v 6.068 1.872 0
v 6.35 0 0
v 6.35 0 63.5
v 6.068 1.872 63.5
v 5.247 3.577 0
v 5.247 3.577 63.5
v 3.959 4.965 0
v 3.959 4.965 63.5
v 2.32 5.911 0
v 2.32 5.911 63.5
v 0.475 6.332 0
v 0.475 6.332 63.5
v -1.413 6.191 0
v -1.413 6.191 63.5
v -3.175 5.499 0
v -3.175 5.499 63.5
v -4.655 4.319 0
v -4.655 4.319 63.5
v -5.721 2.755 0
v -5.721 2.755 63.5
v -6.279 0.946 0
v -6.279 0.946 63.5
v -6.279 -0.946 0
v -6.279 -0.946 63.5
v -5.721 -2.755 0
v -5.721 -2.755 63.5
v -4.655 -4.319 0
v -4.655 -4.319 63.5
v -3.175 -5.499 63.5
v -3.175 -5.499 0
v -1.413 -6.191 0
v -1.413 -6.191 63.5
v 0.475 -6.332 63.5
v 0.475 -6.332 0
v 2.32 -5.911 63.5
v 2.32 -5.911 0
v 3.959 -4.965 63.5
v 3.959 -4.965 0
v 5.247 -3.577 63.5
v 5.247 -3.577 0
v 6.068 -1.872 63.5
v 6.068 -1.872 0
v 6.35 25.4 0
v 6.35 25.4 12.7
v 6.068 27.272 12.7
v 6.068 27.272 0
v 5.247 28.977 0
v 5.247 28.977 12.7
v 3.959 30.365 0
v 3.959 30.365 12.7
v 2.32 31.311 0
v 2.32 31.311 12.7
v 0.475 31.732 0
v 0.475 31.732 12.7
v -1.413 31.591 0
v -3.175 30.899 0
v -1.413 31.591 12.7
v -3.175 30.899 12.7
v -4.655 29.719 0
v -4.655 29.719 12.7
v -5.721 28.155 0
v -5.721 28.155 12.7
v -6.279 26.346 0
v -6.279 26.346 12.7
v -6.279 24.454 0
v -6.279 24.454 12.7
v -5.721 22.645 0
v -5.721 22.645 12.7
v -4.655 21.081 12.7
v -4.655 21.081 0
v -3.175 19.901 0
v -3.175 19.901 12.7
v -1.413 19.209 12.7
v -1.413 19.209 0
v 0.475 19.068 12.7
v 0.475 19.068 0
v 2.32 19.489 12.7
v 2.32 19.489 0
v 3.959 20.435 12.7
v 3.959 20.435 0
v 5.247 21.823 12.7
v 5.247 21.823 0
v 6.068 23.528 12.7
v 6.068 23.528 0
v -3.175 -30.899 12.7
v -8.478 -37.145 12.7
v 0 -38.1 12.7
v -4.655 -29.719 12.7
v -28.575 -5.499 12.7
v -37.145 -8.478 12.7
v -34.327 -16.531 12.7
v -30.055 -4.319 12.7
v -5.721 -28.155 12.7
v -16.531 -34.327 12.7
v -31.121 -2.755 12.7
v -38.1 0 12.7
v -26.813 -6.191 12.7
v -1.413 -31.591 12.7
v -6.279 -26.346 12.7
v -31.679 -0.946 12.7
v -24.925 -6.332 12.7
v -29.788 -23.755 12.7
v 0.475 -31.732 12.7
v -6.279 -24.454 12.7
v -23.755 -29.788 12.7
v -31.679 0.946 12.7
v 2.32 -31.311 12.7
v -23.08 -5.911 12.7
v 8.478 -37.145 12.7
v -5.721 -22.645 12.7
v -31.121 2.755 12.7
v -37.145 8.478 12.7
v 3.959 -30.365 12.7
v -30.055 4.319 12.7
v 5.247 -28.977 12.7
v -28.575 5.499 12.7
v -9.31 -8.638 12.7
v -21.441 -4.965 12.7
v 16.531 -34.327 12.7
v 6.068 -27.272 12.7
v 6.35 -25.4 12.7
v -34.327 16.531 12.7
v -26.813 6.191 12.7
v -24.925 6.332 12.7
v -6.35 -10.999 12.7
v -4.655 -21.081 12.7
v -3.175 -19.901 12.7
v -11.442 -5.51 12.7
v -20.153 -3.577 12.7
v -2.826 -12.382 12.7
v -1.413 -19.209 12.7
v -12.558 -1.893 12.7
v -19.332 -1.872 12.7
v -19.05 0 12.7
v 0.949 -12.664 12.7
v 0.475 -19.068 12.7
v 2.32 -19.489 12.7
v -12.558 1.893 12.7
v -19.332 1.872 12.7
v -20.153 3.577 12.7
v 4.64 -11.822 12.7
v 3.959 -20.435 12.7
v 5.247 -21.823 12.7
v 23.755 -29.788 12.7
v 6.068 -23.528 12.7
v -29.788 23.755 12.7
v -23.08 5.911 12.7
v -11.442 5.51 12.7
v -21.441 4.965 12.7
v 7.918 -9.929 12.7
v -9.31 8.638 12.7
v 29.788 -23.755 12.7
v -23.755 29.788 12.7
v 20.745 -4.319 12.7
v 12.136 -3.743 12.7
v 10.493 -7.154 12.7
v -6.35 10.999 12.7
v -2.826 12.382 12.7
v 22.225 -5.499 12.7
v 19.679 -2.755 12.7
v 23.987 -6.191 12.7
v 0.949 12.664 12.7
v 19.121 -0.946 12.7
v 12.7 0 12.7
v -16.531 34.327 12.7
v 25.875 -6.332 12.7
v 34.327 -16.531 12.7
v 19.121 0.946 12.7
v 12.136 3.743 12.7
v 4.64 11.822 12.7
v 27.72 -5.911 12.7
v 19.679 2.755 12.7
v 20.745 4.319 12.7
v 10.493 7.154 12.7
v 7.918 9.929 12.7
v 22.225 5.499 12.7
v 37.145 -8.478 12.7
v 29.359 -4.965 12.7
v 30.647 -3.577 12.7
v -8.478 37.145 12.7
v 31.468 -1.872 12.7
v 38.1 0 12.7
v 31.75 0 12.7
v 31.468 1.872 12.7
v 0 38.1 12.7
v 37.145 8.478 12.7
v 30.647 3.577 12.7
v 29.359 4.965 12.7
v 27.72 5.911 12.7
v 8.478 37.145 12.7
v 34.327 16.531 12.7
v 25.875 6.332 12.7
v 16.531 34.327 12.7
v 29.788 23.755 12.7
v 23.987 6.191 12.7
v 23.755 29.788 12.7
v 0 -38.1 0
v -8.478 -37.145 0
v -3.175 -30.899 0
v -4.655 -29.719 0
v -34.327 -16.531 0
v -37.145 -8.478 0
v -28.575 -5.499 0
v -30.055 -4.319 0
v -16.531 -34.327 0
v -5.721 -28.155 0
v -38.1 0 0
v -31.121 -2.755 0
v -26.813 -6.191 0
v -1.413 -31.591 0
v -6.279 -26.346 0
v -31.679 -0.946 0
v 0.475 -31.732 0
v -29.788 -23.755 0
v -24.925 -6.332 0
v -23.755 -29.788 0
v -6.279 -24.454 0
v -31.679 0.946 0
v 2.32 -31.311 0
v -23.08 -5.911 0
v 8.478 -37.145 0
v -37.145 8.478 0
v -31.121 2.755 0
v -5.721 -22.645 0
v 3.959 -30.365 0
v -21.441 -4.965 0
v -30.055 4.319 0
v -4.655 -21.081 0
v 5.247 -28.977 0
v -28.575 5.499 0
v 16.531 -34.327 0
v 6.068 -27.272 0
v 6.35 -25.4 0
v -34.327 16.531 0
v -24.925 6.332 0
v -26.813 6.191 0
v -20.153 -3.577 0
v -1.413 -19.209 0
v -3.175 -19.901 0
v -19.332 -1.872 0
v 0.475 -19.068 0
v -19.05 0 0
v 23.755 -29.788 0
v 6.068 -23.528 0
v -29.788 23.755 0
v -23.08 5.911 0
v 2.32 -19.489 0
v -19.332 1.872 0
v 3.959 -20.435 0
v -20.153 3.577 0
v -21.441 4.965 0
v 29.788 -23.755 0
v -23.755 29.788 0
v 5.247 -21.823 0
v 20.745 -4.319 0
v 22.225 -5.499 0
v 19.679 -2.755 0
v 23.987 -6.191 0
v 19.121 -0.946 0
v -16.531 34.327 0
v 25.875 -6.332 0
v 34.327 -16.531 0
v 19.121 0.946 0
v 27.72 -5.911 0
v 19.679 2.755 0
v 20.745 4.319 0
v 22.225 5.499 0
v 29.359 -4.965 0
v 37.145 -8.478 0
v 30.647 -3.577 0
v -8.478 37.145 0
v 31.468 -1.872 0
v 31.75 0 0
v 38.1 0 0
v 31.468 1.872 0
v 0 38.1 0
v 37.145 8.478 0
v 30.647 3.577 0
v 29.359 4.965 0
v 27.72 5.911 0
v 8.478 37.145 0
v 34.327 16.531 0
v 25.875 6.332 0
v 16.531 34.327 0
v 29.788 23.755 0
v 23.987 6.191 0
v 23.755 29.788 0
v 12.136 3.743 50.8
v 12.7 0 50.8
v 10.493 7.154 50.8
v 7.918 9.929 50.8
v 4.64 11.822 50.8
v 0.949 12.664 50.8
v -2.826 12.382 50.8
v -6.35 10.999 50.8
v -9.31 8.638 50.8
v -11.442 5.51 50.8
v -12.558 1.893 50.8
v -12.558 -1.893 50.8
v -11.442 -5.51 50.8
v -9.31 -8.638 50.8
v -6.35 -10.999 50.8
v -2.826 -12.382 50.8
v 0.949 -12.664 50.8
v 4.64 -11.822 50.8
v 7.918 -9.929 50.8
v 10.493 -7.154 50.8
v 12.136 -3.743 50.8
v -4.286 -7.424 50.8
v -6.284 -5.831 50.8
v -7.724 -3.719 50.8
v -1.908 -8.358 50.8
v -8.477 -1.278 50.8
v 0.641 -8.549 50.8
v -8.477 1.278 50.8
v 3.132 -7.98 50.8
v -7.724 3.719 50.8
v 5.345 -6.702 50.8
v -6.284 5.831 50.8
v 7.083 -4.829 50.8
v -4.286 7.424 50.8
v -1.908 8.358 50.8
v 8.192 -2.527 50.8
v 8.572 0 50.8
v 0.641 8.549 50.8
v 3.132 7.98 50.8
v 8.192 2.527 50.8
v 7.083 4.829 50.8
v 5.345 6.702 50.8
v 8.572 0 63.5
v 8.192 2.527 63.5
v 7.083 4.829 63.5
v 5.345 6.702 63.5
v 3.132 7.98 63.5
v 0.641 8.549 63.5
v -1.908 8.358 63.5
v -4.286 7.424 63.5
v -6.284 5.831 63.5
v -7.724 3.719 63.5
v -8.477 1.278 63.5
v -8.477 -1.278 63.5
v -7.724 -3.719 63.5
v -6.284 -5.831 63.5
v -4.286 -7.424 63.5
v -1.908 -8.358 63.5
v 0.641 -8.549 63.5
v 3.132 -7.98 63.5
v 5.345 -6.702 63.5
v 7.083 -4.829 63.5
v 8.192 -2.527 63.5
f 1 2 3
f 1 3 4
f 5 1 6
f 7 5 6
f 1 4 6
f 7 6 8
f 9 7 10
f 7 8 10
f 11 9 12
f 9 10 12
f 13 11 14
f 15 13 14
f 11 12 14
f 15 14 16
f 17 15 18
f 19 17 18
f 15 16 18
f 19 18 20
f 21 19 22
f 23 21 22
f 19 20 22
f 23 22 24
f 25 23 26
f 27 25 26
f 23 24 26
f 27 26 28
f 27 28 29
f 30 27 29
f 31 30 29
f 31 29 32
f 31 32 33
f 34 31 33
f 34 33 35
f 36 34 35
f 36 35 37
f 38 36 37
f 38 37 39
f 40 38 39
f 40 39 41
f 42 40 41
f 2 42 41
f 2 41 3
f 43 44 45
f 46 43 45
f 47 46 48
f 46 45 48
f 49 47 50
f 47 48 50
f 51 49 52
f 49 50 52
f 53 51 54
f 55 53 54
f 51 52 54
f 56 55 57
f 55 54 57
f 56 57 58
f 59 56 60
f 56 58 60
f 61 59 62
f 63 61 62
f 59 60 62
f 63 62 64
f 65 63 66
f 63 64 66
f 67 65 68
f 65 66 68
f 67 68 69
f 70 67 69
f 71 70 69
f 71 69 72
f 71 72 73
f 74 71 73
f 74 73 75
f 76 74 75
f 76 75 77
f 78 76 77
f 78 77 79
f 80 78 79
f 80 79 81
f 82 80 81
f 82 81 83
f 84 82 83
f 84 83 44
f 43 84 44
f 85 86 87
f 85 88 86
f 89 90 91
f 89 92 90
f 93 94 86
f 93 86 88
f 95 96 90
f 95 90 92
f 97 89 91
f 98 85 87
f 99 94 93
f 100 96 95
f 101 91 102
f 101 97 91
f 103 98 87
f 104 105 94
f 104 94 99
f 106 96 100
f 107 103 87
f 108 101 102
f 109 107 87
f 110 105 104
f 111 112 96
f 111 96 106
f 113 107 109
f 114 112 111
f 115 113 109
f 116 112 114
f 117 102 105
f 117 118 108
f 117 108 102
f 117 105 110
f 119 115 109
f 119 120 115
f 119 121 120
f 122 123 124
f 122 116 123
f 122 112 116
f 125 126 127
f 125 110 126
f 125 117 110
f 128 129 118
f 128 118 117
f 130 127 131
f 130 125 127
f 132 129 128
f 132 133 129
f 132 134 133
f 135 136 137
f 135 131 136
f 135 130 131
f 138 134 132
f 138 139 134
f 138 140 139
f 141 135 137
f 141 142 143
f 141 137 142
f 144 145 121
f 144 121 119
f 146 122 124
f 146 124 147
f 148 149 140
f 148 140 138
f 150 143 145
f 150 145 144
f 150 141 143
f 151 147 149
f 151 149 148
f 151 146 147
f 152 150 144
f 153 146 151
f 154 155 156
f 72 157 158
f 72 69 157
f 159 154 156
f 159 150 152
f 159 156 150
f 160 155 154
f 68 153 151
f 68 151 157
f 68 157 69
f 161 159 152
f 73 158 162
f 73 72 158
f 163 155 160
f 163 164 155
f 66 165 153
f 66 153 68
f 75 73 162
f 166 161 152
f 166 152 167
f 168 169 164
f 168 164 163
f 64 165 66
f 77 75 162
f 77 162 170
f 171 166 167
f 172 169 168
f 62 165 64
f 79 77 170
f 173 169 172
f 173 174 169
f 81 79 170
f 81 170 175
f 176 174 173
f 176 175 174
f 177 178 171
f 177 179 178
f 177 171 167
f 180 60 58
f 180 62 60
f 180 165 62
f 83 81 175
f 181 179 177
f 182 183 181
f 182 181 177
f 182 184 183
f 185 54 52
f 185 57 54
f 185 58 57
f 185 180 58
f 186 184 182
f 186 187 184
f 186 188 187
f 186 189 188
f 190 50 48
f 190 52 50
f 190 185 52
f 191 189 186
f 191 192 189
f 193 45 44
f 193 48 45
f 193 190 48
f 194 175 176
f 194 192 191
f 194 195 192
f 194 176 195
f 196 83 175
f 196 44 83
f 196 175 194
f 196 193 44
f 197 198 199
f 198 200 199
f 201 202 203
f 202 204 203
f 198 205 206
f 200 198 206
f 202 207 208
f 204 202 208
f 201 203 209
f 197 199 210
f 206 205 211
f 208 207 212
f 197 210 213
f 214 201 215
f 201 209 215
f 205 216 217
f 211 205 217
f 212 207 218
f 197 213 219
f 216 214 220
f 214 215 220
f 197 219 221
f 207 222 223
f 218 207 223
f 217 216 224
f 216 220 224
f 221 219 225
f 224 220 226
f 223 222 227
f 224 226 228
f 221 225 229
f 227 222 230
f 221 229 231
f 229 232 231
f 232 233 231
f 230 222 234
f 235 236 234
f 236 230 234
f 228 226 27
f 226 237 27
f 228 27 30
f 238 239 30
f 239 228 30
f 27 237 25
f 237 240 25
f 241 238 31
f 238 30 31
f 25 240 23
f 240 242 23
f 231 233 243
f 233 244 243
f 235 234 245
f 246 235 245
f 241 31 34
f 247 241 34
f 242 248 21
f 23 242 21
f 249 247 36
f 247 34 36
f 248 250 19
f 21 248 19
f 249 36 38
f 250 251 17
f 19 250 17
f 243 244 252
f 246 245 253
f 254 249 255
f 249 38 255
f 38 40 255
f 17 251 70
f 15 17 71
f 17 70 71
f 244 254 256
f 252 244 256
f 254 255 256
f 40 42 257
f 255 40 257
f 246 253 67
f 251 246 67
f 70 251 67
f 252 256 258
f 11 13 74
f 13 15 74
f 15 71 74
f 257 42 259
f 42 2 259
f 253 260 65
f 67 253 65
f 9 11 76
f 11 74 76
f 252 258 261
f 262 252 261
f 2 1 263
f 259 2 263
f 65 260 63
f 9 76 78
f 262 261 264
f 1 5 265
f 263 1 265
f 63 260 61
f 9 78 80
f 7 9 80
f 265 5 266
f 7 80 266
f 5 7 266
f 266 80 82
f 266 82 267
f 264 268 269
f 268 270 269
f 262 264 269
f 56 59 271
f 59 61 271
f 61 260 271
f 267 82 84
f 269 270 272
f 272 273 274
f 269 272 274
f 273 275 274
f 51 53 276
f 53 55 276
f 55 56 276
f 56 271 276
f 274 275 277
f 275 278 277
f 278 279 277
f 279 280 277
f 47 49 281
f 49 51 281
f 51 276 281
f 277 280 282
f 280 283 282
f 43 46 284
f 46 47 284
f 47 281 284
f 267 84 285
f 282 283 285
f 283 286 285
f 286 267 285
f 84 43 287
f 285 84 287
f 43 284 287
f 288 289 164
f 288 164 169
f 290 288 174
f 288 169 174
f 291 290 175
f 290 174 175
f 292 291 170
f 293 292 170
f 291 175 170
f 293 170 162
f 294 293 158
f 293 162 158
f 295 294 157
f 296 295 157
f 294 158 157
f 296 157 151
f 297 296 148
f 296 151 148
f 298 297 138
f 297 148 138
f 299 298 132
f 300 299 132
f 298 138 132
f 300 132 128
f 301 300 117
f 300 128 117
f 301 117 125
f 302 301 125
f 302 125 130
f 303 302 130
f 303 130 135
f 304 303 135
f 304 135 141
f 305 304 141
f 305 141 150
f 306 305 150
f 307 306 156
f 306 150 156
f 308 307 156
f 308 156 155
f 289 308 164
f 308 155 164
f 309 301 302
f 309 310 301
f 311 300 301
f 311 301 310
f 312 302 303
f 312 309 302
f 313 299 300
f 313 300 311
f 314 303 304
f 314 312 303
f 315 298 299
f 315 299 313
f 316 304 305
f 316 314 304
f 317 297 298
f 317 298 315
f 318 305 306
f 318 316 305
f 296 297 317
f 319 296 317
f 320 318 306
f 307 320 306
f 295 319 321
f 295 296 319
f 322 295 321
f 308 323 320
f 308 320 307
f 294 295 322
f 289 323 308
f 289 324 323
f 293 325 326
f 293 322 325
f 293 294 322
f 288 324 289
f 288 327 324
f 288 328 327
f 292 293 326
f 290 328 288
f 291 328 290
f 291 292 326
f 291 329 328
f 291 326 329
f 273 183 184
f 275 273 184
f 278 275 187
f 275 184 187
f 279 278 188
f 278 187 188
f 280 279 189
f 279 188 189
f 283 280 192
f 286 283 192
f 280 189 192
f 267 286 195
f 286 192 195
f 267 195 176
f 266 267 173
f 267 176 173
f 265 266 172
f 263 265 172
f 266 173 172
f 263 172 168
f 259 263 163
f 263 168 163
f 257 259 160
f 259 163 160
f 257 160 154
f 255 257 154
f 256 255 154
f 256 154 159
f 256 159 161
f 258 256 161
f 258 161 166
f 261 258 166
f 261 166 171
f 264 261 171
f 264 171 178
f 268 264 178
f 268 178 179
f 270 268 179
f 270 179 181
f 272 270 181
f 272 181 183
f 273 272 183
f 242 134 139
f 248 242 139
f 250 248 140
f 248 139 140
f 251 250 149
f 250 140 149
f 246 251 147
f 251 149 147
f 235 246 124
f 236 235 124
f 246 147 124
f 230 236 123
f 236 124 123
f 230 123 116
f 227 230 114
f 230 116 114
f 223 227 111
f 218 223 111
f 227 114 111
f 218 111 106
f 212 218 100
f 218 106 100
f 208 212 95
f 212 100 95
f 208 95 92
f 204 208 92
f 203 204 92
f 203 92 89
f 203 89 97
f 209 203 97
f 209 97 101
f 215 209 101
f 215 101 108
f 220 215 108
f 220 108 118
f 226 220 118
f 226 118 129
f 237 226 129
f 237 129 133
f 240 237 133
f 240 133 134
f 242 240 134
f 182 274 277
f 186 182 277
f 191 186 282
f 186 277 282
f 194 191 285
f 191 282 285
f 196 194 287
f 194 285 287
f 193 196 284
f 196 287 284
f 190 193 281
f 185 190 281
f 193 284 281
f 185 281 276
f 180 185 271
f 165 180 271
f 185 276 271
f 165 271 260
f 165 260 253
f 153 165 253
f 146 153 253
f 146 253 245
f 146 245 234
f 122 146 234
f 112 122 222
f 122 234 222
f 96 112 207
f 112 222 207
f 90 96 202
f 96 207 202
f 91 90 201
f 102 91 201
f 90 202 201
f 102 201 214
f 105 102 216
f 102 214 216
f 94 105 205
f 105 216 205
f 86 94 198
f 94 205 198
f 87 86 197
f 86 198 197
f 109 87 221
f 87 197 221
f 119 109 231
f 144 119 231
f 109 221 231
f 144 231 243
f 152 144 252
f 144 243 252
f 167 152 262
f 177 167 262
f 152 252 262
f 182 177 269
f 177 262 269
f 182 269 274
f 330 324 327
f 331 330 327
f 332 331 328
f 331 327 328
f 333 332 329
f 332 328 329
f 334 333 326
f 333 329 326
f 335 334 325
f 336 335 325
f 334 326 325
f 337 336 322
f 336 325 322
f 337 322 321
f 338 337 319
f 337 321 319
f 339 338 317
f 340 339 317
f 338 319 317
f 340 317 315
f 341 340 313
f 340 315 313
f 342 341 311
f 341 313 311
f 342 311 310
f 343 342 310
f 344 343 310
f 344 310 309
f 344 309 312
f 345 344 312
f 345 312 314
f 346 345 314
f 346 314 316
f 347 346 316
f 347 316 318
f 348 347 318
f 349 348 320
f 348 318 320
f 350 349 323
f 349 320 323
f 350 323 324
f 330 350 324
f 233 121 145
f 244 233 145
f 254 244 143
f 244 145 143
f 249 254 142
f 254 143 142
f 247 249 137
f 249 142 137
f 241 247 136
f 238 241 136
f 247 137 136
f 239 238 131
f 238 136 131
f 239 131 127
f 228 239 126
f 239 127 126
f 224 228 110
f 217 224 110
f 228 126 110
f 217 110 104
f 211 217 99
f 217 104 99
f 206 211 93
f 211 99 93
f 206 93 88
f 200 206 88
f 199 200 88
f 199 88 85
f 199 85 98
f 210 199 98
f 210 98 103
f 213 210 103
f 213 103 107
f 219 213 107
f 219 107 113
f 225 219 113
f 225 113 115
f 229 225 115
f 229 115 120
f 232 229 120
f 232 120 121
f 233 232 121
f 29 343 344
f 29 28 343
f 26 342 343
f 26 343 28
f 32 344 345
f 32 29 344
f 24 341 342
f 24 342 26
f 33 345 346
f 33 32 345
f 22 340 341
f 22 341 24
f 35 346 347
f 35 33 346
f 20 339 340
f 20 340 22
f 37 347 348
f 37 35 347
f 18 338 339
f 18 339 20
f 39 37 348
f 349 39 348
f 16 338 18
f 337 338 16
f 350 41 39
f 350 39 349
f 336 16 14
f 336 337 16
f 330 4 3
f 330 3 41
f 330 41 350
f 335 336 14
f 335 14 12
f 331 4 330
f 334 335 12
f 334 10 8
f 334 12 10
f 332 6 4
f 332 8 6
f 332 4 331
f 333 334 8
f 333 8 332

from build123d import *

# Parameters (mm, degrees)
F0_R     = 38.1
F1_DEPTH = 12.7
F2_R     = 6.35
F3_DEPTH = 12.701
F4_R     = 12.7
F5_DEPTH = 38.1
F6_R     = 8.5725
F7_DEPTH = 12.7
F8_R     = 6.35
F9_DEPTH = 63.501


with BuildPart() as f1:
    # F0 (on Top) → F1 (new body)
    with BuildSketch(Plane.XY):
        Circle(F0_R)
    extrude(amount=F1_DEPTH)

    # F2 (on face) → F3 (cut, through all)
    with BuildSketch(Plane.XY.offset(12.7)):
        with Locations((0, 25.4)):
            Circle(F2_R)
        with Locations((25.4, 0)):
            Circle(F2_R)
        with Locations((0, -25.4)):
            Circle(F2_R)
        with Locations((-25.4, 0)):
            Circle(F2_R)
    extrude(amount=-F3_DEPTH, mode=Mode.SUBTRACT)

    # F4 (on face) → F5 (join)
    with BuildSketch(Plane.XY.offset(12.7)):
        Circle(F4_R)
    extrude(amount=F5_DEPTH)

    # F6 (on face) → F7 (join)
    with BuildSketch(Plane.XY.offset(50.8)):
        Circle(F6_R)
    extrude(amount=F7_DEPTH)

    # F8 (on face) → F9 (cut, through all)
    with BuildSketch(Plane.XY.offset(63.5)):
        Circle(F8_R)
    extrude(amount=-F9_DEPTH, mode=Mode.SUBTRACT)


solid = f1.part
